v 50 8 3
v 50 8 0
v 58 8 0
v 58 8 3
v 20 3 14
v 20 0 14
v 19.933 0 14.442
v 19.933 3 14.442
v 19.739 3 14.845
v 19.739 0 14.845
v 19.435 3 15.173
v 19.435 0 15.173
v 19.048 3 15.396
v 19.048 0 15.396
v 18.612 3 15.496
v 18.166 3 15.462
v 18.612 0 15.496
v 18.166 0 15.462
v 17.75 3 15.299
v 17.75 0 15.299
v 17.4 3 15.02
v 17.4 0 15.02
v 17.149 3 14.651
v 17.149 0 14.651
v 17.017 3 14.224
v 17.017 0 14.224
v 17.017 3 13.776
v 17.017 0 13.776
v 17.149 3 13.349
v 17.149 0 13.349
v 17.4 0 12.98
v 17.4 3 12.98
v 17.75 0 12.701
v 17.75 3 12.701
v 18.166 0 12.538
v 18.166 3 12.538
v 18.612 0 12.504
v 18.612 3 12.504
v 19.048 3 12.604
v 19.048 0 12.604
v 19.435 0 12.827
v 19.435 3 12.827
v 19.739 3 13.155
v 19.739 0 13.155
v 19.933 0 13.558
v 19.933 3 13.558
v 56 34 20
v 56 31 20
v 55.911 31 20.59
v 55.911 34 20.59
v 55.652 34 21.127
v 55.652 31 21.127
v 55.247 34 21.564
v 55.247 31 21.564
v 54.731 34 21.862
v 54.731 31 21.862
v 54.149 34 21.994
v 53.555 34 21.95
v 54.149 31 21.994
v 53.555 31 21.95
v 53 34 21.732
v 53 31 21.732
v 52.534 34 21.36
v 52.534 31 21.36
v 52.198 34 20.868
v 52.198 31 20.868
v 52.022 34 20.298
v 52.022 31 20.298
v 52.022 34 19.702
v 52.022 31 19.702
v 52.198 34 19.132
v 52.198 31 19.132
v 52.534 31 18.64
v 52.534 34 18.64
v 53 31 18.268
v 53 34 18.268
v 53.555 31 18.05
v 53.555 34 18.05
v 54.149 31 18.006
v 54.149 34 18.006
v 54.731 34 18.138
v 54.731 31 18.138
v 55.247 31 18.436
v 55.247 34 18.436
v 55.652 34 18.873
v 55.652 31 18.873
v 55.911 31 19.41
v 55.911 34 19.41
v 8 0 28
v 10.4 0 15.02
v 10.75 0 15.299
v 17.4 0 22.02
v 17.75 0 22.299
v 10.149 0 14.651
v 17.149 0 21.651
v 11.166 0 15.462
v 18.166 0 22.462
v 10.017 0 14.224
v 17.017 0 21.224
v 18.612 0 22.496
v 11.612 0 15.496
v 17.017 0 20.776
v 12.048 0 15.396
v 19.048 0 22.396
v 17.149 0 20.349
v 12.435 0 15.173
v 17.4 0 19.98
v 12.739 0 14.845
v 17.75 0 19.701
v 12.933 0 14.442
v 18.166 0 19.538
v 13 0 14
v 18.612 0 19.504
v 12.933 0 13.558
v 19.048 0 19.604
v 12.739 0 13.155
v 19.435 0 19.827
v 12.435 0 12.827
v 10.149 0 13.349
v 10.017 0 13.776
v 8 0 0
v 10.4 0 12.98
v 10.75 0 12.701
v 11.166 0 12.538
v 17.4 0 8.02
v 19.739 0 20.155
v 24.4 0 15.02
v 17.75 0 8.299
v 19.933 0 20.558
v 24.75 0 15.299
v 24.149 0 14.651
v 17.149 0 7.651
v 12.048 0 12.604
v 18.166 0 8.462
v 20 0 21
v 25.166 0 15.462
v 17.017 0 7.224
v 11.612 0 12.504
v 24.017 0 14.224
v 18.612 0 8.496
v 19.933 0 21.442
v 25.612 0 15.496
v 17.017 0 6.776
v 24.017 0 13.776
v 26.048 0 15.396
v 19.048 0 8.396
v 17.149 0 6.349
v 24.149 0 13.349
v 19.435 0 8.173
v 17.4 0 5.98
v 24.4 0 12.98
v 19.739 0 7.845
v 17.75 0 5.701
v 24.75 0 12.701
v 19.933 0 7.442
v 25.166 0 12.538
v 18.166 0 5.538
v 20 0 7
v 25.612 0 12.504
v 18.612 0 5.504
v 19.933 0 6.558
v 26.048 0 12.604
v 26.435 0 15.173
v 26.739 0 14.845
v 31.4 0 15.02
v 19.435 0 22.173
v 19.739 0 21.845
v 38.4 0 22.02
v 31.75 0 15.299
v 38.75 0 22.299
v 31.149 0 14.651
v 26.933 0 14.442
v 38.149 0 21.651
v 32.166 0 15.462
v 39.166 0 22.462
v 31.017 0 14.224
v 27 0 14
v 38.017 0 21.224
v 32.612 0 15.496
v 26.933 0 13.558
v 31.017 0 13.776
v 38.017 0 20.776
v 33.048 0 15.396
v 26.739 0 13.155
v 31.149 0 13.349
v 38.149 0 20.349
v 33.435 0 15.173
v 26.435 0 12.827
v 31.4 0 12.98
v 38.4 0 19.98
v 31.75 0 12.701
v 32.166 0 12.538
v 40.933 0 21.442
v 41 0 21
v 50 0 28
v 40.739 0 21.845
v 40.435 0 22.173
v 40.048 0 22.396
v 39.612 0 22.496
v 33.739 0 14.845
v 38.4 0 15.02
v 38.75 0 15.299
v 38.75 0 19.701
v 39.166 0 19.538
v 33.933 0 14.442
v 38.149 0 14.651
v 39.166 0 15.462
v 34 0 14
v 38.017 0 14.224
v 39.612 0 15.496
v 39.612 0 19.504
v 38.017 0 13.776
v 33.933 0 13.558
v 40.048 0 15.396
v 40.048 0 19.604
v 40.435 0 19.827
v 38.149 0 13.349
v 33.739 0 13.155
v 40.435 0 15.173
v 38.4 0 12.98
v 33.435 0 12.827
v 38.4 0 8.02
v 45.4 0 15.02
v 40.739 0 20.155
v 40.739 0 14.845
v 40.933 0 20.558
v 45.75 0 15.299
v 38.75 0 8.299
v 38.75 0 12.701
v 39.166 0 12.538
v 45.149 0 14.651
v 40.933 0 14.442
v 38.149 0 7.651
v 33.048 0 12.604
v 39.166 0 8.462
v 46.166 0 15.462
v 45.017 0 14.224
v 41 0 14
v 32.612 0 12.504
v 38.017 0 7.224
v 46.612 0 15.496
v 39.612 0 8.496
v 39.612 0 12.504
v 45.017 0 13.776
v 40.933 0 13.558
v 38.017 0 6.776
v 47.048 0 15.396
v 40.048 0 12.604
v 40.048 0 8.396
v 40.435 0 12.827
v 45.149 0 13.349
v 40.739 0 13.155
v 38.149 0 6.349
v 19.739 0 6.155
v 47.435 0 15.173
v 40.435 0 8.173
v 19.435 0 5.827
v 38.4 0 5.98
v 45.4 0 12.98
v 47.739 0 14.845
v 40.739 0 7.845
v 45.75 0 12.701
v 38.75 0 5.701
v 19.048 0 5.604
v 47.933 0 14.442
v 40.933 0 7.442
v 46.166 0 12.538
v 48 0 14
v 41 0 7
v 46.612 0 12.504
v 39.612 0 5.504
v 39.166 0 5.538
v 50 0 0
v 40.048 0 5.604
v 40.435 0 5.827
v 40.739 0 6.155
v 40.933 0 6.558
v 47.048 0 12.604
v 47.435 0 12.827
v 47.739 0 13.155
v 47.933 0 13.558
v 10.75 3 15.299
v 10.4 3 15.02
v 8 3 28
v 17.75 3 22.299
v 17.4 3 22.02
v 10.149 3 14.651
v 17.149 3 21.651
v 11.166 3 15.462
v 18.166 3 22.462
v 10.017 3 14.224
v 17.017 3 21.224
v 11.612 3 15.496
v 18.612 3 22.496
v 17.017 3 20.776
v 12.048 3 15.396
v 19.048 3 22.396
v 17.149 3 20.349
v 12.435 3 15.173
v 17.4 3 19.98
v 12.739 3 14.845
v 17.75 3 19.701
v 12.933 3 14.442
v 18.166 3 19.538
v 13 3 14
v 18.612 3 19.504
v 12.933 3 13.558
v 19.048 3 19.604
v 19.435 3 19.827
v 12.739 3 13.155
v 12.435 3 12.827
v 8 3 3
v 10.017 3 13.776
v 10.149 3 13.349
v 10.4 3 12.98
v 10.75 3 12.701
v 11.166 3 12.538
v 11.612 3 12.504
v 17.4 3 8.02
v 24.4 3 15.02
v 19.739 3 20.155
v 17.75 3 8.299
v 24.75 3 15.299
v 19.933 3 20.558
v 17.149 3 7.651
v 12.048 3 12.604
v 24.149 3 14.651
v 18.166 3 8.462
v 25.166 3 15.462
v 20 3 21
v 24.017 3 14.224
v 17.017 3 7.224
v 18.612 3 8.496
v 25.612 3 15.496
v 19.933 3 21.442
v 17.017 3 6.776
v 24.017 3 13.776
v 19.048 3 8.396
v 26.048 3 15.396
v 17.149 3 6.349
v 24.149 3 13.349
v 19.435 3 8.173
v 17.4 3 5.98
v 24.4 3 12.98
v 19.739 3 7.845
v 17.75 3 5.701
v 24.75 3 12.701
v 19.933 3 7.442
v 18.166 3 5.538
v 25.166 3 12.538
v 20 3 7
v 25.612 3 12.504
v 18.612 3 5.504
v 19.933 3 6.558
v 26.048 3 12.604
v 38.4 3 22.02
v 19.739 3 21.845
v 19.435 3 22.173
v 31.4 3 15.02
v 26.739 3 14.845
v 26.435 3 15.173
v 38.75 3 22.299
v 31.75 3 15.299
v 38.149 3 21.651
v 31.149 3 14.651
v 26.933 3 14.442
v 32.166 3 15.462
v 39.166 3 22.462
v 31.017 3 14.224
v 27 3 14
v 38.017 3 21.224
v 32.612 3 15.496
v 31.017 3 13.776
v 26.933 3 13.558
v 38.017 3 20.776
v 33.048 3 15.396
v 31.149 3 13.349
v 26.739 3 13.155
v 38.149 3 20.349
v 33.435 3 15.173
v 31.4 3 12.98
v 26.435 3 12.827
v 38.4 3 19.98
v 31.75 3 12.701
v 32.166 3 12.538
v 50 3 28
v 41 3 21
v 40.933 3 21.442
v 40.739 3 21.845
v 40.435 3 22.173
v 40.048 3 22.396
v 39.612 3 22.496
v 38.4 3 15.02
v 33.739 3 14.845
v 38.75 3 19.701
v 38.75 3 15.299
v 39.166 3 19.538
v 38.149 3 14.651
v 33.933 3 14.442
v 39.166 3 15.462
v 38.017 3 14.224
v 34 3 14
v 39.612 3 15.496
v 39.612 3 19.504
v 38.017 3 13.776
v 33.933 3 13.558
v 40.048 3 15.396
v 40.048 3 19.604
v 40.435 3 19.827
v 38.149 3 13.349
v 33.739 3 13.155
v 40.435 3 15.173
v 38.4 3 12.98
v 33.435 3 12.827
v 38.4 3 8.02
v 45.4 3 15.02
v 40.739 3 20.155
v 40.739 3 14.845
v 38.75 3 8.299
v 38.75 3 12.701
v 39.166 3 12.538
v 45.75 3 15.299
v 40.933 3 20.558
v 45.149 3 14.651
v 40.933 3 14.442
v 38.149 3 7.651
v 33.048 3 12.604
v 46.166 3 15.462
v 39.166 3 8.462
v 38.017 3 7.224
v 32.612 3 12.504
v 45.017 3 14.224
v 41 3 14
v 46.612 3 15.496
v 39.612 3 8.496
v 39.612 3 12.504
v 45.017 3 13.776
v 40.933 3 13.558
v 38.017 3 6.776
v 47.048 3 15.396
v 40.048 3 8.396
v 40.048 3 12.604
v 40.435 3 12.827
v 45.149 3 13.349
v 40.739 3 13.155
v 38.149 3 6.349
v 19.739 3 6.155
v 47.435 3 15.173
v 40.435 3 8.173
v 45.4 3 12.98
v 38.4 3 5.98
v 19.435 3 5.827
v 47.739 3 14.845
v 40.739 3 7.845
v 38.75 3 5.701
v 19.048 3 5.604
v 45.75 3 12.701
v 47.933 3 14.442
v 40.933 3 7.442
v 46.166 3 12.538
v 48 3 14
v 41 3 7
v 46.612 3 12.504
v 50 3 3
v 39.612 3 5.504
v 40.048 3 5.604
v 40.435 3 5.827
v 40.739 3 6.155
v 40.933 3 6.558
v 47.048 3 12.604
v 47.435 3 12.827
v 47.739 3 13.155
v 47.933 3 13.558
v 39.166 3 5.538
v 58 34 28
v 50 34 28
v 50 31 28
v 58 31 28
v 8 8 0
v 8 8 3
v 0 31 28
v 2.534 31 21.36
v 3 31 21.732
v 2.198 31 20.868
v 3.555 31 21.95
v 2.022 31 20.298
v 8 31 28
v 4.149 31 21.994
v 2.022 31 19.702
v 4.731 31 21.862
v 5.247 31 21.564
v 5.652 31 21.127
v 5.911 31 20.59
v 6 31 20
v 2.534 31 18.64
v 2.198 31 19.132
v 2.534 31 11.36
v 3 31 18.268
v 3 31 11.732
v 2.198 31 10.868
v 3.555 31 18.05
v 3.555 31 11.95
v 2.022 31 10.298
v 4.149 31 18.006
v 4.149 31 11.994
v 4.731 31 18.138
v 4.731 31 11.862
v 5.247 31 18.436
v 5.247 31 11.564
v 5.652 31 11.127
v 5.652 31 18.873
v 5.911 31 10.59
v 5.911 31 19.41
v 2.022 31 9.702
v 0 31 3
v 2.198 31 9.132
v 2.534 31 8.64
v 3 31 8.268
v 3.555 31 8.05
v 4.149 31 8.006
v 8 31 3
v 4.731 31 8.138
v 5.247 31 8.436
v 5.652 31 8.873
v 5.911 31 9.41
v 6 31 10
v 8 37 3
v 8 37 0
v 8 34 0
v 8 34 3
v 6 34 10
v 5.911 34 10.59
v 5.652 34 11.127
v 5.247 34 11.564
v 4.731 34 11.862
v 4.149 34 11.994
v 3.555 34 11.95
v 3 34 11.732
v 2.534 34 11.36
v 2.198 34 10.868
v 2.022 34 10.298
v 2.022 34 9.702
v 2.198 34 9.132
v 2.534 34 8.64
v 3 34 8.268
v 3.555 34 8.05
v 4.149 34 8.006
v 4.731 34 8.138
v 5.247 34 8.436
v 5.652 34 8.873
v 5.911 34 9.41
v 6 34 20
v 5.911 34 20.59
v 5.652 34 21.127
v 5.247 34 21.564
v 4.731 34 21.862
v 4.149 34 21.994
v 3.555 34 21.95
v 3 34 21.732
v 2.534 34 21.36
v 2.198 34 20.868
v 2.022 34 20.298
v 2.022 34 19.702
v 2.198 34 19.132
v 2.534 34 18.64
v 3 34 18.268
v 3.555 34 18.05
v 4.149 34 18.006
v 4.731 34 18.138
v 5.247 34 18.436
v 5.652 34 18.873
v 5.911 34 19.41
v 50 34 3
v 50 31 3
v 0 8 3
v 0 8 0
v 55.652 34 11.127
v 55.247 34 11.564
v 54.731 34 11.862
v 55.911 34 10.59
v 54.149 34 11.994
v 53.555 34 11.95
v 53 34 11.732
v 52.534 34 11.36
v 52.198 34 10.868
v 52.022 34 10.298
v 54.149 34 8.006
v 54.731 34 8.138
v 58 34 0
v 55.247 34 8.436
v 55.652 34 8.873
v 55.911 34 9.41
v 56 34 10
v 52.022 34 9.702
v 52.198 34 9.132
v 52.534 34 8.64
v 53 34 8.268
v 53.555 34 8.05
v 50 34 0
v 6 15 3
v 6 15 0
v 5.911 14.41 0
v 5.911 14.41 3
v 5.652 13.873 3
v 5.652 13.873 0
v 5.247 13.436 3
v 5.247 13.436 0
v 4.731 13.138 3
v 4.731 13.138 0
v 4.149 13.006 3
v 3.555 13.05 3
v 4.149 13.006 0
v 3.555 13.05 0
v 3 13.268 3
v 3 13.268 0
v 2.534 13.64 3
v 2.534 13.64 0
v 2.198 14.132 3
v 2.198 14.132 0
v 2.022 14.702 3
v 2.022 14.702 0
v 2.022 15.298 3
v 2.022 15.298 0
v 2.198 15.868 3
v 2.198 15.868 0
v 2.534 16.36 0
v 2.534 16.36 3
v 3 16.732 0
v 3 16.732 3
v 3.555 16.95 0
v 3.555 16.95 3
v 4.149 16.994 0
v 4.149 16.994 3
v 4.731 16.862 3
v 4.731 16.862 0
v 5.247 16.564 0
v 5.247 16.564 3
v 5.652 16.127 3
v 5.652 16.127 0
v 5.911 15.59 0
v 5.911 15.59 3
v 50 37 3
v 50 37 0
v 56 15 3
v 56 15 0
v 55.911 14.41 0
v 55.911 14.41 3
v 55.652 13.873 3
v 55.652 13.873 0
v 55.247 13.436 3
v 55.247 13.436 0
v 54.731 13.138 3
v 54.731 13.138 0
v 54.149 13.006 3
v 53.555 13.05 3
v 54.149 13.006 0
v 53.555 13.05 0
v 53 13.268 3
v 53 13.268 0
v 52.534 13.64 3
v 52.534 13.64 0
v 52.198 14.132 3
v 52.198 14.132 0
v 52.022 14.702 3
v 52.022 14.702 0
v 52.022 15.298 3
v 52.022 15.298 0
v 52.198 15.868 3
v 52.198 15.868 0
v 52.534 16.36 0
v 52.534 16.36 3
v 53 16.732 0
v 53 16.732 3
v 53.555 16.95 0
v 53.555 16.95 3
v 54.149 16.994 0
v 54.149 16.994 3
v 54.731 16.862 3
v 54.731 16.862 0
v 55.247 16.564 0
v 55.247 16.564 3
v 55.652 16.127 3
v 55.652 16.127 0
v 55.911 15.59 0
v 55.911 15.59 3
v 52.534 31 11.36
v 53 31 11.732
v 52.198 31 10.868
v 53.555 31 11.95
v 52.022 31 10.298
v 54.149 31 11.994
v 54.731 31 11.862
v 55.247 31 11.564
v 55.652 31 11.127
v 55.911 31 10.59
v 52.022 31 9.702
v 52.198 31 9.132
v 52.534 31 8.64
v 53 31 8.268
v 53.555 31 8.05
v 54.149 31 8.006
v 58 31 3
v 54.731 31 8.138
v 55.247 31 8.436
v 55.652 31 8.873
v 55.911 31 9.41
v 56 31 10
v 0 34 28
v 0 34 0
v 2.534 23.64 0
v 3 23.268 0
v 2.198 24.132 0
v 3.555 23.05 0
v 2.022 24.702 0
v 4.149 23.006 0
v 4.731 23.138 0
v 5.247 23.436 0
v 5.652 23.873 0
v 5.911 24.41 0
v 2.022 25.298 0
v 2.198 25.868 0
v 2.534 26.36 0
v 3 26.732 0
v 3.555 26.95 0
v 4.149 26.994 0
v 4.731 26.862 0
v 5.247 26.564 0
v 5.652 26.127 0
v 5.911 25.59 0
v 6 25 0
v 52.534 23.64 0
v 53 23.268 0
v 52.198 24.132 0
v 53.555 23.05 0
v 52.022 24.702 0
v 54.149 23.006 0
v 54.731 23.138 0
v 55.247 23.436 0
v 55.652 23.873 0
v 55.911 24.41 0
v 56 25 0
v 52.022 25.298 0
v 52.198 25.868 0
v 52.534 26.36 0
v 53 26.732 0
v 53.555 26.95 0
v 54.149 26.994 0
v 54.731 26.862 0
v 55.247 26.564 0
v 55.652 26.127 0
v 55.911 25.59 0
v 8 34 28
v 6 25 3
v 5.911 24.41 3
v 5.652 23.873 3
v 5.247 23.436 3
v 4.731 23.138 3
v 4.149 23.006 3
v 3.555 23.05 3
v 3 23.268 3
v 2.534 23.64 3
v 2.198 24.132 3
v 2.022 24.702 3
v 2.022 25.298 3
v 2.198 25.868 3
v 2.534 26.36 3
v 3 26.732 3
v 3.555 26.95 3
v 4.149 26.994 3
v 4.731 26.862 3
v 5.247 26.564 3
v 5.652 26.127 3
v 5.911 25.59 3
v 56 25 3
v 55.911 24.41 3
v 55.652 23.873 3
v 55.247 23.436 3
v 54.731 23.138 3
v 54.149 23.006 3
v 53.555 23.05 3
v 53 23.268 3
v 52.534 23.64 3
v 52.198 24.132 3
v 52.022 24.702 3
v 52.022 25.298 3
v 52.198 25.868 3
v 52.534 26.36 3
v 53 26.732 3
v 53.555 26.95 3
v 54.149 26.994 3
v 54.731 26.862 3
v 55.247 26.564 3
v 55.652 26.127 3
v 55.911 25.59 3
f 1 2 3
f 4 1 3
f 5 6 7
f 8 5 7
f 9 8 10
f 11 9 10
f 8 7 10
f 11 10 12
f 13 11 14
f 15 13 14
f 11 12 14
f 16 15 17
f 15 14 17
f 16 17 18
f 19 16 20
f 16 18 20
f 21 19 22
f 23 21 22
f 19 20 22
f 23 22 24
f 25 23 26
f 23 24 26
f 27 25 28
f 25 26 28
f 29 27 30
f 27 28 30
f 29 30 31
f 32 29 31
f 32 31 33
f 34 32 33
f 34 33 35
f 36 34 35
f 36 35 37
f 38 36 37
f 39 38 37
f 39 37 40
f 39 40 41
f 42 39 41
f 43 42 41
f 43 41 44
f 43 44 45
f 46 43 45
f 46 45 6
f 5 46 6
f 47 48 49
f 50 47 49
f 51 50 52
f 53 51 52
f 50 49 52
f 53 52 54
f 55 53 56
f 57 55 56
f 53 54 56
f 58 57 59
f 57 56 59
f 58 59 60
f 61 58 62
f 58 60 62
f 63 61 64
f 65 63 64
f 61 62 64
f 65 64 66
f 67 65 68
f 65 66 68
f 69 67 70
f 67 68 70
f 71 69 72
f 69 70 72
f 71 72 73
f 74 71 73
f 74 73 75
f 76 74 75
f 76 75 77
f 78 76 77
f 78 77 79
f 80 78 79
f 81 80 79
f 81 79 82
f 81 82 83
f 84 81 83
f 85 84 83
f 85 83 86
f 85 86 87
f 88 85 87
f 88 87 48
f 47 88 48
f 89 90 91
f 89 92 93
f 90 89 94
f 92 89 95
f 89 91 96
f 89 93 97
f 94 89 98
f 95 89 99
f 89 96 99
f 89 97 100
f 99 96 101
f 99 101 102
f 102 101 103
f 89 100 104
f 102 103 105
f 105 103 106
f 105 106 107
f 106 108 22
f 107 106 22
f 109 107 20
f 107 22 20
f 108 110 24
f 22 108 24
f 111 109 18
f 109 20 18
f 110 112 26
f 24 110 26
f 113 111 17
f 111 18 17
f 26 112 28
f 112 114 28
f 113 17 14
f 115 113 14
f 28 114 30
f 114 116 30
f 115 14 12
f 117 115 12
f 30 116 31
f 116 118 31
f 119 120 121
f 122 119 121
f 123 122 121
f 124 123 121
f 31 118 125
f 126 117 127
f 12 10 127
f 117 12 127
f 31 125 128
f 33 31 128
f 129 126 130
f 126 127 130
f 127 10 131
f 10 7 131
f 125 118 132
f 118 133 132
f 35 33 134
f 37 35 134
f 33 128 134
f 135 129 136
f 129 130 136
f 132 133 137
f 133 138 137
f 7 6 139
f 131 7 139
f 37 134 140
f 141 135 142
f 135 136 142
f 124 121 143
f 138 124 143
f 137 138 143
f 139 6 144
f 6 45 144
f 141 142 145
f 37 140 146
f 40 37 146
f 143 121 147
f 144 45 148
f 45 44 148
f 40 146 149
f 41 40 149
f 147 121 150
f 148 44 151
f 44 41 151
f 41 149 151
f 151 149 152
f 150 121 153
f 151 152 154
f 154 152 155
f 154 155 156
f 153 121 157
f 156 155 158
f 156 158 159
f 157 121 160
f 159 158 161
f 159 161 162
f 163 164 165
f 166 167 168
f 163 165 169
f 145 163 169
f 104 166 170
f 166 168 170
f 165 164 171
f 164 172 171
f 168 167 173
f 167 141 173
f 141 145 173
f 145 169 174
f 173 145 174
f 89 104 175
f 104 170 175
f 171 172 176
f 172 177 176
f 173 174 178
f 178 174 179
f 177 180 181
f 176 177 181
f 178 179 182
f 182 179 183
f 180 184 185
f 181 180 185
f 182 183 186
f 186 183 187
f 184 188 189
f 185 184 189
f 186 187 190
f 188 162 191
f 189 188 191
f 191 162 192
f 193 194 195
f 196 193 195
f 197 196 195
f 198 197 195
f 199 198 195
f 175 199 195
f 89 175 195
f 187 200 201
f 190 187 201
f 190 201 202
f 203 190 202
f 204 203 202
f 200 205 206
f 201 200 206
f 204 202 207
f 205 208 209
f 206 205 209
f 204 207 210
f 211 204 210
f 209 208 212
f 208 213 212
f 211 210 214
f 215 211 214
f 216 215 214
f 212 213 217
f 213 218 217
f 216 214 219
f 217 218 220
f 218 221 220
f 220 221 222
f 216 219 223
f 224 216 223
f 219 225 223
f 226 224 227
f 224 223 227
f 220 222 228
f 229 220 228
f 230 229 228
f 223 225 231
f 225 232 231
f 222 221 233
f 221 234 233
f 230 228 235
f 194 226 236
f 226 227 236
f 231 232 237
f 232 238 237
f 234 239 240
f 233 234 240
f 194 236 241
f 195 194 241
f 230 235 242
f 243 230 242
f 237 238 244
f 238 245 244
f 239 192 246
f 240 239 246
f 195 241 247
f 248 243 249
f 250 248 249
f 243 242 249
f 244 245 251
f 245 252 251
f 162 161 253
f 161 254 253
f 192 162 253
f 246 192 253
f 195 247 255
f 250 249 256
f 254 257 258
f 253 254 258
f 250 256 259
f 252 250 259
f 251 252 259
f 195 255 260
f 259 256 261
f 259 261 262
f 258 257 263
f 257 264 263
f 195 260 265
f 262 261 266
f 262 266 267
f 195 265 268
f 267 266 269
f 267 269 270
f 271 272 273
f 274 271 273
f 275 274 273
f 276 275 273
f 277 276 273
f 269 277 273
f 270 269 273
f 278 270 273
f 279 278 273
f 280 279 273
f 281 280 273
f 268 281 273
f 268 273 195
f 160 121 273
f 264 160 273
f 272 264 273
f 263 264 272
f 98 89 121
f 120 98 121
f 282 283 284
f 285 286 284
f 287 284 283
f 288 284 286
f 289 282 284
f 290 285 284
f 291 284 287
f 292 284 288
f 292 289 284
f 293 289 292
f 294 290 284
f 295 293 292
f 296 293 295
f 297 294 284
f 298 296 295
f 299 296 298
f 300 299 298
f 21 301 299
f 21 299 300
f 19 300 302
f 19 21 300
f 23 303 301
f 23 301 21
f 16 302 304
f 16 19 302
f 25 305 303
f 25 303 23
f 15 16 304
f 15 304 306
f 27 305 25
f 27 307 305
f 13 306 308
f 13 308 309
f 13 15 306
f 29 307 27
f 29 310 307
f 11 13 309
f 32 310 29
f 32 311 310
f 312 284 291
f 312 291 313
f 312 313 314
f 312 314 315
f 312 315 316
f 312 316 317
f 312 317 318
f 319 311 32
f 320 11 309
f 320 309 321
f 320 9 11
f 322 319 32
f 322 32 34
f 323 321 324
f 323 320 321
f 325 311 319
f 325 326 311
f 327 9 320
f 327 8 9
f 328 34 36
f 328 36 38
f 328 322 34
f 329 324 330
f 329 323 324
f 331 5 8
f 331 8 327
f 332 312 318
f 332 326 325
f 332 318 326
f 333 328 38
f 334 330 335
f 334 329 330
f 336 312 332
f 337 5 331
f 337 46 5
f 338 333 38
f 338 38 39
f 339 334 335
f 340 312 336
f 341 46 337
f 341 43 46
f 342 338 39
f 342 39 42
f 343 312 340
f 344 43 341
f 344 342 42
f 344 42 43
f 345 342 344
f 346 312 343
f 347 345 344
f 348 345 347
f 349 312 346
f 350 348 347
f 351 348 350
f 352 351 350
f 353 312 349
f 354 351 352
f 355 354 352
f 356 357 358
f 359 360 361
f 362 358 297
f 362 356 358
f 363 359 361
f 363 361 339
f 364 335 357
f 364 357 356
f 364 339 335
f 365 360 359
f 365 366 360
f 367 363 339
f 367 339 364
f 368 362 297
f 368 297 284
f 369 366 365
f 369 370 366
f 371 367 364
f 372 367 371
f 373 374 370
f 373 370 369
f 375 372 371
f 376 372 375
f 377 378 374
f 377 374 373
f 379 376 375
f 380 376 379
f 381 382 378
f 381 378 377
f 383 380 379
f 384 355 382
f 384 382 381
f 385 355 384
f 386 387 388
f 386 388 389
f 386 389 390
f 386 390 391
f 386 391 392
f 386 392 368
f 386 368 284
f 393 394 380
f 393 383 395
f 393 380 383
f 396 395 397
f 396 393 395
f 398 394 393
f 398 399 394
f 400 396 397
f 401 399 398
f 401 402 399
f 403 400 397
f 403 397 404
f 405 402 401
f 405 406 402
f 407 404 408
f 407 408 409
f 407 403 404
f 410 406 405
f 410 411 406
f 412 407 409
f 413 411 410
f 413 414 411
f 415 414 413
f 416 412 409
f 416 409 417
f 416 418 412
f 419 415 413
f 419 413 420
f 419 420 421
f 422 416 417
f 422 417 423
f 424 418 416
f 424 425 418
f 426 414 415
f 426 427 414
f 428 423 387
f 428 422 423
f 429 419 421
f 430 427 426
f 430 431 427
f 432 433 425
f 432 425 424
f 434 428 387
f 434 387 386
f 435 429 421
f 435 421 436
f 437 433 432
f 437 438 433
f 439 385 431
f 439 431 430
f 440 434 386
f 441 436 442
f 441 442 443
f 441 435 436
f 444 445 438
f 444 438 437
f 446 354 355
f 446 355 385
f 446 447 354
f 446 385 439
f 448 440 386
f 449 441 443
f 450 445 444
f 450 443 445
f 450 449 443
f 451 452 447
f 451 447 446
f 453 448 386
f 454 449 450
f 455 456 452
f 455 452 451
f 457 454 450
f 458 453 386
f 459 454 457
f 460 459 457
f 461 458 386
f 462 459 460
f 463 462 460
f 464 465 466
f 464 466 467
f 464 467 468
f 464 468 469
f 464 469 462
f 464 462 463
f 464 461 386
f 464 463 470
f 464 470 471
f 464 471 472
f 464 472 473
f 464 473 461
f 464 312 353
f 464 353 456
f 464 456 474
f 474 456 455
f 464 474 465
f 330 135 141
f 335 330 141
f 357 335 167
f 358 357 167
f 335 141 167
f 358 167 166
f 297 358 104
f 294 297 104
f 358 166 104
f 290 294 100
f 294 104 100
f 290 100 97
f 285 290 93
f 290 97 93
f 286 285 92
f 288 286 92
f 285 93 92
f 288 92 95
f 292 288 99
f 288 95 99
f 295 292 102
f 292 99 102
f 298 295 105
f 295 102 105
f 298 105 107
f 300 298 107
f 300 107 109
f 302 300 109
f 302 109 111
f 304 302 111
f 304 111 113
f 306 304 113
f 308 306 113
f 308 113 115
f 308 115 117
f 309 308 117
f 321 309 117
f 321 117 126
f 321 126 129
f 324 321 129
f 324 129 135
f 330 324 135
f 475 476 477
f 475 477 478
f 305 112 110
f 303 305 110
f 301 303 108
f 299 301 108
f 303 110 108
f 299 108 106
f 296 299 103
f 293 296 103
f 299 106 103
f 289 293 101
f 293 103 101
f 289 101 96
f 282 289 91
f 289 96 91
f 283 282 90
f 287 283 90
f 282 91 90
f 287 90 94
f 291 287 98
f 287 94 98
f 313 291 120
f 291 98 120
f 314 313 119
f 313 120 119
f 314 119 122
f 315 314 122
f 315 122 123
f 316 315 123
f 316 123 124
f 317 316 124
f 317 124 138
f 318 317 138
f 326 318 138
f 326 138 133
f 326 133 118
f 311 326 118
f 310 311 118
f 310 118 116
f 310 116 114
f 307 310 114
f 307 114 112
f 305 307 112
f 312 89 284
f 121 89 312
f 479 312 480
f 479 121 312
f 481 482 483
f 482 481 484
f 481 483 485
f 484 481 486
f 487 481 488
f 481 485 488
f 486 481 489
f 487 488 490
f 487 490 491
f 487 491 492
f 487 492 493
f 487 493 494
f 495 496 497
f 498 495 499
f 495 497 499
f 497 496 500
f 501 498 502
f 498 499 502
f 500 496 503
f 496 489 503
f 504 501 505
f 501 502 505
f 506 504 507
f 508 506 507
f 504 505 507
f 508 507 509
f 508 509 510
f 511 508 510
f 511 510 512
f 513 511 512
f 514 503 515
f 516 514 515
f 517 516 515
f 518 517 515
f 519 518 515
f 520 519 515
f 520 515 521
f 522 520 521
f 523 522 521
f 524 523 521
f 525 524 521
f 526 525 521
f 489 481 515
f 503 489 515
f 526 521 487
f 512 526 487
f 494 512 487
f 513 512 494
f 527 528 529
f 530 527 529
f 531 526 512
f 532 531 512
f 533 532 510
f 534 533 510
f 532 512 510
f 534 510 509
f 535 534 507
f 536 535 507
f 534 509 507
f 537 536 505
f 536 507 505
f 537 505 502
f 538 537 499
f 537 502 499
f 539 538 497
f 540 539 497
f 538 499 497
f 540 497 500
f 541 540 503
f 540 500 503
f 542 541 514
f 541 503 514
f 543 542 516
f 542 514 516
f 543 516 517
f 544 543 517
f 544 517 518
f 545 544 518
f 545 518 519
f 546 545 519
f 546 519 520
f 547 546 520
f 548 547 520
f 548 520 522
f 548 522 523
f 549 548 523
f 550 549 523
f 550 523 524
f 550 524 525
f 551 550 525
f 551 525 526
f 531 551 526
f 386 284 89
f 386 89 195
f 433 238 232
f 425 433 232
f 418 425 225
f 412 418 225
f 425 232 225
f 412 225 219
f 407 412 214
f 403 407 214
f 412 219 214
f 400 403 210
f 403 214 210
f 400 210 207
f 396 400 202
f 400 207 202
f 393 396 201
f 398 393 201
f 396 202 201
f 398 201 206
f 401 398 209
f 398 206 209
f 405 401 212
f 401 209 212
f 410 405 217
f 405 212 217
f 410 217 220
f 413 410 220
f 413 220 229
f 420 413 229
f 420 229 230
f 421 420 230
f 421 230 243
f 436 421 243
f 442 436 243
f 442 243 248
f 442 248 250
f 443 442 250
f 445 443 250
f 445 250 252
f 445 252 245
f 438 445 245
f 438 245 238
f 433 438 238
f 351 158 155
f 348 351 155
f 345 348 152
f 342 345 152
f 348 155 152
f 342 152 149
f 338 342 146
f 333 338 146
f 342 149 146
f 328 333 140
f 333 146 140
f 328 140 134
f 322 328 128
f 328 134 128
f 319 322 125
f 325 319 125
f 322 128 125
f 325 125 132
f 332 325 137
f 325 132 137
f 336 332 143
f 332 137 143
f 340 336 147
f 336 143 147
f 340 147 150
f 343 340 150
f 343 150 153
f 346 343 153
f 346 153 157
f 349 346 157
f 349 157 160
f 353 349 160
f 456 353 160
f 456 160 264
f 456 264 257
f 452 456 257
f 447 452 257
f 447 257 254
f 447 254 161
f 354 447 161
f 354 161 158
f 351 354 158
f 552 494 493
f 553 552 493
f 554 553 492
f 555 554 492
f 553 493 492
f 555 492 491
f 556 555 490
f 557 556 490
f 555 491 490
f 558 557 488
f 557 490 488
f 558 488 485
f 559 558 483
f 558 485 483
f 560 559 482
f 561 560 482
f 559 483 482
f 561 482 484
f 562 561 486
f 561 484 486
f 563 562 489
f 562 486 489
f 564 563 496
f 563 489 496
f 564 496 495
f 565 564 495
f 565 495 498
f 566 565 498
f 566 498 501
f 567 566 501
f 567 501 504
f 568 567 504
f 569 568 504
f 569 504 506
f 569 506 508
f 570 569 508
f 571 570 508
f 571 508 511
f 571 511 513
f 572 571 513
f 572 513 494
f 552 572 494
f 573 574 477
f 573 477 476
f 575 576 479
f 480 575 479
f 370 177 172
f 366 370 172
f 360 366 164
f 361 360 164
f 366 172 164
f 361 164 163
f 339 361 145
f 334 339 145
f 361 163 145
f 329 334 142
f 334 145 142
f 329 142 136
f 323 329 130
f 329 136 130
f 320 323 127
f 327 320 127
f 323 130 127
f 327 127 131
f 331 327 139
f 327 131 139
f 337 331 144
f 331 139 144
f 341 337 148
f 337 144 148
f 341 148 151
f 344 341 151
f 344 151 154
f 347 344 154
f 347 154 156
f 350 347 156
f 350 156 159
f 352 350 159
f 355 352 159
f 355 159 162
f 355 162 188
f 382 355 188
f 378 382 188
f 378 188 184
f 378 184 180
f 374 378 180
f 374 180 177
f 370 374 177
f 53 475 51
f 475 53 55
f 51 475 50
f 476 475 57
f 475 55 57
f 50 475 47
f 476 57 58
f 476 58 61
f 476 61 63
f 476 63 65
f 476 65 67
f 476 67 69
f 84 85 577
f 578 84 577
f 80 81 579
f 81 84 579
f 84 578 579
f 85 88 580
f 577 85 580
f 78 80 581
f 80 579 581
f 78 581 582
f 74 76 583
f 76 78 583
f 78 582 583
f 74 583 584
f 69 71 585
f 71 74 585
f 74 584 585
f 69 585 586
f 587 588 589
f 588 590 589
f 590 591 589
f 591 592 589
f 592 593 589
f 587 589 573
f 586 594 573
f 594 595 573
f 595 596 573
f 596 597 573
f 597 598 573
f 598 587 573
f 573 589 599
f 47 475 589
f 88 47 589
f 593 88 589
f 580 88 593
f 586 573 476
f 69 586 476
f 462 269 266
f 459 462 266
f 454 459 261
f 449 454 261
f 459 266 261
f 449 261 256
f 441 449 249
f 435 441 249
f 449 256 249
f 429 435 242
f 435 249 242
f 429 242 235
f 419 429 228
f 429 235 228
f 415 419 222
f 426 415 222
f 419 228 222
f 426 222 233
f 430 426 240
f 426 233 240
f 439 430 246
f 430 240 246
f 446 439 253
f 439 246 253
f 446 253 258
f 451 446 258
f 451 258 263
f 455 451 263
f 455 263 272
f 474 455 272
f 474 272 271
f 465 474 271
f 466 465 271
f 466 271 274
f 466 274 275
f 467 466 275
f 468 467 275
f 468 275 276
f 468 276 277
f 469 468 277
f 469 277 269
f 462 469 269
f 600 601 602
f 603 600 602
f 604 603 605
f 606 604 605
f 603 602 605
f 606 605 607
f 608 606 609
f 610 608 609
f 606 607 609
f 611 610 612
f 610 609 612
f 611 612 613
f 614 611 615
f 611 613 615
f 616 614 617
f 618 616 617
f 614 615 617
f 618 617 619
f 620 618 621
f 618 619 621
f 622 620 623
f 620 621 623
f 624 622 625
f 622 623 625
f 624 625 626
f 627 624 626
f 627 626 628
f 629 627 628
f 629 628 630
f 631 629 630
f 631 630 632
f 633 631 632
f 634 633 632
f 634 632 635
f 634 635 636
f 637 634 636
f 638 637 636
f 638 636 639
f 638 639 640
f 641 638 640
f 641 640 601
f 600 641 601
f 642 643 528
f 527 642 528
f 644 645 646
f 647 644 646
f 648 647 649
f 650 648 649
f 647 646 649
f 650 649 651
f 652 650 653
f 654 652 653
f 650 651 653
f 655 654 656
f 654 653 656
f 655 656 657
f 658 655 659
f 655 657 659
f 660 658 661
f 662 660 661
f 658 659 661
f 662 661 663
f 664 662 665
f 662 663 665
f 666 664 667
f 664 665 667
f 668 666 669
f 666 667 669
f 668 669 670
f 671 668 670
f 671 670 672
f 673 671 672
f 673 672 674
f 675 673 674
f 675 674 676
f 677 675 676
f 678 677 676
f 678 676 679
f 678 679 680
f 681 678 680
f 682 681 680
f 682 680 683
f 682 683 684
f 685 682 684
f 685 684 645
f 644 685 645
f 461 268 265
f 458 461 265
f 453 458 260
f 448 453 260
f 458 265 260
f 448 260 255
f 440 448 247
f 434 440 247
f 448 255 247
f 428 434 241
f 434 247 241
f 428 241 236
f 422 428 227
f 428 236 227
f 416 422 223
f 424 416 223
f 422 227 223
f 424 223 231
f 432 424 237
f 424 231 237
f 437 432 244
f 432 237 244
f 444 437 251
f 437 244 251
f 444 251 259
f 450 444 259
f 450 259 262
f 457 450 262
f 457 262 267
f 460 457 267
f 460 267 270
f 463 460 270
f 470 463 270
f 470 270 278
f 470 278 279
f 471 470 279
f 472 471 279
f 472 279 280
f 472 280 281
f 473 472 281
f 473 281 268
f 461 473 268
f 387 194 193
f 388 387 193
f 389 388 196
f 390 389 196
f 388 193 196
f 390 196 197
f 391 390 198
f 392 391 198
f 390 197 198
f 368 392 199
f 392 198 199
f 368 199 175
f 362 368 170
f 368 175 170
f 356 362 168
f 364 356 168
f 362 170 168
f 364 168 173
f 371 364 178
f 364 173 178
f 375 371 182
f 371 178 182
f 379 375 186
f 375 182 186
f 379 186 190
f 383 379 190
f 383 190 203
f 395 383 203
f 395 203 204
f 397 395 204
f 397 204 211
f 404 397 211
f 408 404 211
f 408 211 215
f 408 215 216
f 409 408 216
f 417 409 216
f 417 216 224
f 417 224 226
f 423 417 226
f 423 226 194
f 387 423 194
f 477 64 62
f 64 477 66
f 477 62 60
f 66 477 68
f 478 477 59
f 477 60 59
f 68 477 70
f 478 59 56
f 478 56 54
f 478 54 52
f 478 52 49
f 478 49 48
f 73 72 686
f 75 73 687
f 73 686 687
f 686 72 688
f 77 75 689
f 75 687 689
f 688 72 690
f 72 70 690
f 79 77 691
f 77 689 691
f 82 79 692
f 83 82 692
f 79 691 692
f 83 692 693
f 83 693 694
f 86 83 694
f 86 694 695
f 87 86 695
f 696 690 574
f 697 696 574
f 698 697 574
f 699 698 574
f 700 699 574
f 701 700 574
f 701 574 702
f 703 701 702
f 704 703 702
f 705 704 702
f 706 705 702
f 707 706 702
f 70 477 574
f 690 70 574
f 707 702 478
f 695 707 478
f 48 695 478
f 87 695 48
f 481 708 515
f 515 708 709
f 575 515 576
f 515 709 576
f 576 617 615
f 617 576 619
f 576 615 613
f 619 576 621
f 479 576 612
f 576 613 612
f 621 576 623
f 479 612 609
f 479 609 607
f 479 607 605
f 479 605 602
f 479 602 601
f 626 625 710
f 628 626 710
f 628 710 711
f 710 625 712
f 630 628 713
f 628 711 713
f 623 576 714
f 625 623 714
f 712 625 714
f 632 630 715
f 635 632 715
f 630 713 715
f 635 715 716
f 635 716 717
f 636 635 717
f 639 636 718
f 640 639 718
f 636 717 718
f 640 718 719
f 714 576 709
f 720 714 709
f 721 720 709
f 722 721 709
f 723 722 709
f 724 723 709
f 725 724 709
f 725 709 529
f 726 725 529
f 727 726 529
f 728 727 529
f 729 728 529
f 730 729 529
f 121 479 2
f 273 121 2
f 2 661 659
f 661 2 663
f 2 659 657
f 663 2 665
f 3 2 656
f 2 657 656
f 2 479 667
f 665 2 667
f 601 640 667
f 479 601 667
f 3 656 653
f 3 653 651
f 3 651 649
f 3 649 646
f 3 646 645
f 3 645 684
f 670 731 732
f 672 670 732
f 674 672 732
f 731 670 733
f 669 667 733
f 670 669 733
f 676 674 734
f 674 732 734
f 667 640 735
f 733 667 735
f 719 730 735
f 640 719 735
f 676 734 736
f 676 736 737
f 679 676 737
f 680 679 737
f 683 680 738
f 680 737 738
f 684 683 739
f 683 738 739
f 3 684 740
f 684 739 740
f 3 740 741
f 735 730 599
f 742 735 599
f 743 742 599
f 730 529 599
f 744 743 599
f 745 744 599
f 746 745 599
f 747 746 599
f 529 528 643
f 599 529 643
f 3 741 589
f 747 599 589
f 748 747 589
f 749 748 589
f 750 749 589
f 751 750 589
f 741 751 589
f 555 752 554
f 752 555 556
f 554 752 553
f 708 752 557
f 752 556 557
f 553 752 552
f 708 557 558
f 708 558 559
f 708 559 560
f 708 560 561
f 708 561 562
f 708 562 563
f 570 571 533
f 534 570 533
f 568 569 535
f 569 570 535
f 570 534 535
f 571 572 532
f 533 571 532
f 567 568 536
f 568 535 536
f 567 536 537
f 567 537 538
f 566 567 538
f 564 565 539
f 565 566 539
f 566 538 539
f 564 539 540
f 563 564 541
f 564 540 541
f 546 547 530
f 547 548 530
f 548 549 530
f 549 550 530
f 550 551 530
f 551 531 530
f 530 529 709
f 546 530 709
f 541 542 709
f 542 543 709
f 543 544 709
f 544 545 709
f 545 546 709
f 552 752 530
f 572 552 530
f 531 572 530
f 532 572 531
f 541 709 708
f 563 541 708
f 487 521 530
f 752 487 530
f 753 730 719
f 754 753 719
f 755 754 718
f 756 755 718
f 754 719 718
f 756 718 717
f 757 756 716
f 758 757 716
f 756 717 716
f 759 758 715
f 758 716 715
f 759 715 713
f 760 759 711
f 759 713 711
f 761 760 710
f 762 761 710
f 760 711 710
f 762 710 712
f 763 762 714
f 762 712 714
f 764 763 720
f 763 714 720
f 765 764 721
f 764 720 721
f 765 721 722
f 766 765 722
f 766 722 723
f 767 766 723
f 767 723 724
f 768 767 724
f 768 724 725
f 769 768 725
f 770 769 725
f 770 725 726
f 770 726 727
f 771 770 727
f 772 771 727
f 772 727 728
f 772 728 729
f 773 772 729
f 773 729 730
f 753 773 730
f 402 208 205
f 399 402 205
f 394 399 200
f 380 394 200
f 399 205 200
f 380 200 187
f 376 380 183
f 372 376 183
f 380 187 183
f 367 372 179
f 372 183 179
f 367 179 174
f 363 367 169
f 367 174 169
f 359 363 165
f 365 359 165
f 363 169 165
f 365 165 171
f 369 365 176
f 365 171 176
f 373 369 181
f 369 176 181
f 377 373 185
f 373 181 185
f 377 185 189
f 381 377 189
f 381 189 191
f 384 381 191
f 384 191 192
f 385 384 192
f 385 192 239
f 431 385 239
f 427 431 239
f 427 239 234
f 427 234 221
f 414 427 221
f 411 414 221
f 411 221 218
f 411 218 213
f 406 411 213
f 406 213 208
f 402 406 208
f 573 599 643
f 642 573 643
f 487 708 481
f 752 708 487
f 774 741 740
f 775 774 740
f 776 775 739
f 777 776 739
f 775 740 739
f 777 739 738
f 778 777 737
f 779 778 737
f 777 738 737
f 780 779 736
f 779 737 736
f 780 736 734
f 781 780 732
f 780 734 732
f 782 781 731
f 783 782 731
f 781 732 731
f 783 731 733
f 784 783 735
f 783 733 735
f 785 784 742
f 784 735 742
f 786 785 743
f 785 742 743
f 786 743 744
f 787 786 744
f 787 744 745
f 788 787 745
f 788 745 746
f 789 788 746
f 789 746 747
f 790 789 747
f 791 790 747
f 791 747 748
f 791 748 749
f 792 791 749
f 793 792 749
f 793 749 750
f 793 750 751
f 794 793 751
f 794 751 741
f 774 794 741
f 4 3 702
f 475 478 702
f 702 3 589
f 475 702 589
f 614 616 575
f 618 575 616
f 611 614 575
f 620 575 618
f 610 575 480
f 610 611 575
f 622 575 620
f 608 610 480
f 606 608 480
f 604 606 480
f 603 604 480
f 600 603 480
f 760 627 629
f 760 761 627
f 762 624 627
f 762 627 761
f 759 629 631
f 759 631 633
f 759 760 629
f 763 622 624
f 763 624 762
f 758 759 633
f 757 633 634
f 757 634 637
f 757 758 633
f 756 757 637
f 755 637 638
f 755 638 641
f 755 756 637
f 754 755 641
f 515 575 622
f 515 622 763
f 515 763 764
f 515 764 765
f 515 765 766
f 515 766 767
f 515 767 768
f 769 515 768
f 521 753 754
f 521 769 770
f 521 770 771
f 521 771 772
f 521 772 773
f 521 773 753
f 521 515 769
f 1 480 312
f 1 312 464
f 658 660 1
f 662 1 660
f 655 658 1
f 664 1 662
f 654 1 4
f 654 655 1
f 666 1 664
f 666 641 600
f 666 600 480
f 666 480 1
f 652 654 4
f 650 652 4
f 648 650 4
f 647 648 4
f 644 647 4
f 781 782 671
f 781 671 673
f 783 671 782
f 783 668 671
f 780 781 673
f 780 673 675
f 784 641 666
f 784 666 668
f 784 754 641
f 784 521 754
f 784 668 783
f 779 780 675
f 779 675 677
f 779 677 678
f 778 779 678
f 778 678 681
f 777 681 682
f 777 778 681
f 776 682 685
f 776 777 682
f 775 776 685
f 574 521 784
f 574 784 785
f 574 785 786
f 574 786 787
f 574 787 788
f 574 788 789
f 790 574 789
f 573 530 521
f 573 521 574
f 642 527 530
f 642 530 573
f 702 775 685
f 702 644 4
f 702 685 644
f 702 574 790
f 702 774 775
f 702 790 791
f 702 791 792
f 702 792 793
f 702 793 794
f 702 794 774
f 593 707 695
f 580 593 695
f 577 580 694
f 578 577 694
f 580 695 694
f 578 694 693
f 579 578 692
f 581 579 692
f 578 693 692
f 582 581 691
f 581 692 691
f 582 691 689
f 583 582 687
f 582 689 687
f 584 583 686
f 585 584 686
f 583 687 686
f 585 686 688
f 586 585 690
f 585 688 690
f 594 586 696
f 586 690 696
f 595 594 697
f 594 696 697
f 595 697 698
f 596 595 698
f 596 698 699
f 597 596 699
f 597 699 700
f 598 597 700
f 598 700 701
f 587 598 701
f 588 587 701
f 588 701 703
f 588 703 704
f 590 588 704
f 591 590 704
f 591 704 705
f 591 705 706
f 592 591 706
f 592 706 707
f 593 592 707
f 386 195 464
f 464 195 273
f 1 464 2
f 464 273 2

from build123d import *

# Parameters (mm, degrees)
F1_DEPTH = 3
F2_W     = 42
F2_H     = 3
F2_W_2   = 8
F3_DEPTH = 25
F4_R     = 2
F5_DEPTH = 37.001
F6_R     = 1.5
F7_DEPTH = 37.001
F8_R     = 2
F9_DEPTH = 28.001


with BuildPart() as f1:
    # F0 (on Top) → F1 (new body)
    with BuildSketch(Plane.XY):
        Polygon((8, 8), (8, 0), (50, 0), (50, 8), (58, 8), (58, 34), (50, 34), (50, 37), (8, 37), (8, 34), (0, 34), (0, 8), align=None)
    extrude(amount=F1_DEPTH)

    # F2 (on face) → F3 (join)
    with BuildSketch(Plane.XY.offset(3)):
        with Locations((29, 1.5)):
            Rectangle(F2_W, F2_H)
        with Locations((4, 32.5)):
            Rectangle(F2_W_2, F2_H)
        with Locations((54, 32.5)):
            Rectangle(F2_W_2, F2_H)
    extrude(amount=F3_DEPTH)

    # F4 (on Front) → F5 (cut, through all)
    with BuildSketch(Plane.XZ):
        with Locations((54, 20)):
            Circle(F4_R)
        with Locations((54, 10)):
            Circle(F4_R)
        with Locations((4, 20)):
            Circle(F4_R)
        with Locations((4, 10)):
            Circle(F4_R)
    extrude(amount=-F5_DEPTH, mode=Mode.SUBTRACT)

    # F6 (on face) → F7 (cut, through all)
    with BuildSketch(Plane.XZ):
        with Locations((39.5, 14)):
            Circle(F6_R)
        with Locations((39.5, 21)):
            Circle(F6_R)
        with Locations((32.5, 14)):
            Circle(F6_R)
        with Locations((25.5, 14)):
            Circle(F6_R)
        with Locations((18.5, 14)):
            Circle(F6_R)
        with Locations((11.5, 14)):
            Circle(F6_R)
        with Locations((46.5, 14)):
            Circle(F6_R)
        with Locations((18.5, 21)):
            Circle(F6_R)
        with Locations((39.5, 7)):
            Circle(F6_R)
        with Locations((18.5, 7)):
            Circle(F6_R)
    extrude(amount=-F7_DEPTH, mode=Mode.SUBTRACT)

    # F8 (on face) → F9 (cut, through all)
    with BuildSketch(Plane(origin=(0, 0, 0), x_dir=(1, 0, 0), z_dir=(0, 0, -1))):
        with Locations((4, -15)):
            Circle(F8_R)
        with Locations((4, -25)):
            Circle(F8_R)
        with Locations((54, -25)):
            Circle(F8_R)
        with Locations((54, -15)):
            Circle(F8_R)
    extrude(amount=-F9_DEPTH, mode=Mode.SUBTRACT)


solid = f1.part
